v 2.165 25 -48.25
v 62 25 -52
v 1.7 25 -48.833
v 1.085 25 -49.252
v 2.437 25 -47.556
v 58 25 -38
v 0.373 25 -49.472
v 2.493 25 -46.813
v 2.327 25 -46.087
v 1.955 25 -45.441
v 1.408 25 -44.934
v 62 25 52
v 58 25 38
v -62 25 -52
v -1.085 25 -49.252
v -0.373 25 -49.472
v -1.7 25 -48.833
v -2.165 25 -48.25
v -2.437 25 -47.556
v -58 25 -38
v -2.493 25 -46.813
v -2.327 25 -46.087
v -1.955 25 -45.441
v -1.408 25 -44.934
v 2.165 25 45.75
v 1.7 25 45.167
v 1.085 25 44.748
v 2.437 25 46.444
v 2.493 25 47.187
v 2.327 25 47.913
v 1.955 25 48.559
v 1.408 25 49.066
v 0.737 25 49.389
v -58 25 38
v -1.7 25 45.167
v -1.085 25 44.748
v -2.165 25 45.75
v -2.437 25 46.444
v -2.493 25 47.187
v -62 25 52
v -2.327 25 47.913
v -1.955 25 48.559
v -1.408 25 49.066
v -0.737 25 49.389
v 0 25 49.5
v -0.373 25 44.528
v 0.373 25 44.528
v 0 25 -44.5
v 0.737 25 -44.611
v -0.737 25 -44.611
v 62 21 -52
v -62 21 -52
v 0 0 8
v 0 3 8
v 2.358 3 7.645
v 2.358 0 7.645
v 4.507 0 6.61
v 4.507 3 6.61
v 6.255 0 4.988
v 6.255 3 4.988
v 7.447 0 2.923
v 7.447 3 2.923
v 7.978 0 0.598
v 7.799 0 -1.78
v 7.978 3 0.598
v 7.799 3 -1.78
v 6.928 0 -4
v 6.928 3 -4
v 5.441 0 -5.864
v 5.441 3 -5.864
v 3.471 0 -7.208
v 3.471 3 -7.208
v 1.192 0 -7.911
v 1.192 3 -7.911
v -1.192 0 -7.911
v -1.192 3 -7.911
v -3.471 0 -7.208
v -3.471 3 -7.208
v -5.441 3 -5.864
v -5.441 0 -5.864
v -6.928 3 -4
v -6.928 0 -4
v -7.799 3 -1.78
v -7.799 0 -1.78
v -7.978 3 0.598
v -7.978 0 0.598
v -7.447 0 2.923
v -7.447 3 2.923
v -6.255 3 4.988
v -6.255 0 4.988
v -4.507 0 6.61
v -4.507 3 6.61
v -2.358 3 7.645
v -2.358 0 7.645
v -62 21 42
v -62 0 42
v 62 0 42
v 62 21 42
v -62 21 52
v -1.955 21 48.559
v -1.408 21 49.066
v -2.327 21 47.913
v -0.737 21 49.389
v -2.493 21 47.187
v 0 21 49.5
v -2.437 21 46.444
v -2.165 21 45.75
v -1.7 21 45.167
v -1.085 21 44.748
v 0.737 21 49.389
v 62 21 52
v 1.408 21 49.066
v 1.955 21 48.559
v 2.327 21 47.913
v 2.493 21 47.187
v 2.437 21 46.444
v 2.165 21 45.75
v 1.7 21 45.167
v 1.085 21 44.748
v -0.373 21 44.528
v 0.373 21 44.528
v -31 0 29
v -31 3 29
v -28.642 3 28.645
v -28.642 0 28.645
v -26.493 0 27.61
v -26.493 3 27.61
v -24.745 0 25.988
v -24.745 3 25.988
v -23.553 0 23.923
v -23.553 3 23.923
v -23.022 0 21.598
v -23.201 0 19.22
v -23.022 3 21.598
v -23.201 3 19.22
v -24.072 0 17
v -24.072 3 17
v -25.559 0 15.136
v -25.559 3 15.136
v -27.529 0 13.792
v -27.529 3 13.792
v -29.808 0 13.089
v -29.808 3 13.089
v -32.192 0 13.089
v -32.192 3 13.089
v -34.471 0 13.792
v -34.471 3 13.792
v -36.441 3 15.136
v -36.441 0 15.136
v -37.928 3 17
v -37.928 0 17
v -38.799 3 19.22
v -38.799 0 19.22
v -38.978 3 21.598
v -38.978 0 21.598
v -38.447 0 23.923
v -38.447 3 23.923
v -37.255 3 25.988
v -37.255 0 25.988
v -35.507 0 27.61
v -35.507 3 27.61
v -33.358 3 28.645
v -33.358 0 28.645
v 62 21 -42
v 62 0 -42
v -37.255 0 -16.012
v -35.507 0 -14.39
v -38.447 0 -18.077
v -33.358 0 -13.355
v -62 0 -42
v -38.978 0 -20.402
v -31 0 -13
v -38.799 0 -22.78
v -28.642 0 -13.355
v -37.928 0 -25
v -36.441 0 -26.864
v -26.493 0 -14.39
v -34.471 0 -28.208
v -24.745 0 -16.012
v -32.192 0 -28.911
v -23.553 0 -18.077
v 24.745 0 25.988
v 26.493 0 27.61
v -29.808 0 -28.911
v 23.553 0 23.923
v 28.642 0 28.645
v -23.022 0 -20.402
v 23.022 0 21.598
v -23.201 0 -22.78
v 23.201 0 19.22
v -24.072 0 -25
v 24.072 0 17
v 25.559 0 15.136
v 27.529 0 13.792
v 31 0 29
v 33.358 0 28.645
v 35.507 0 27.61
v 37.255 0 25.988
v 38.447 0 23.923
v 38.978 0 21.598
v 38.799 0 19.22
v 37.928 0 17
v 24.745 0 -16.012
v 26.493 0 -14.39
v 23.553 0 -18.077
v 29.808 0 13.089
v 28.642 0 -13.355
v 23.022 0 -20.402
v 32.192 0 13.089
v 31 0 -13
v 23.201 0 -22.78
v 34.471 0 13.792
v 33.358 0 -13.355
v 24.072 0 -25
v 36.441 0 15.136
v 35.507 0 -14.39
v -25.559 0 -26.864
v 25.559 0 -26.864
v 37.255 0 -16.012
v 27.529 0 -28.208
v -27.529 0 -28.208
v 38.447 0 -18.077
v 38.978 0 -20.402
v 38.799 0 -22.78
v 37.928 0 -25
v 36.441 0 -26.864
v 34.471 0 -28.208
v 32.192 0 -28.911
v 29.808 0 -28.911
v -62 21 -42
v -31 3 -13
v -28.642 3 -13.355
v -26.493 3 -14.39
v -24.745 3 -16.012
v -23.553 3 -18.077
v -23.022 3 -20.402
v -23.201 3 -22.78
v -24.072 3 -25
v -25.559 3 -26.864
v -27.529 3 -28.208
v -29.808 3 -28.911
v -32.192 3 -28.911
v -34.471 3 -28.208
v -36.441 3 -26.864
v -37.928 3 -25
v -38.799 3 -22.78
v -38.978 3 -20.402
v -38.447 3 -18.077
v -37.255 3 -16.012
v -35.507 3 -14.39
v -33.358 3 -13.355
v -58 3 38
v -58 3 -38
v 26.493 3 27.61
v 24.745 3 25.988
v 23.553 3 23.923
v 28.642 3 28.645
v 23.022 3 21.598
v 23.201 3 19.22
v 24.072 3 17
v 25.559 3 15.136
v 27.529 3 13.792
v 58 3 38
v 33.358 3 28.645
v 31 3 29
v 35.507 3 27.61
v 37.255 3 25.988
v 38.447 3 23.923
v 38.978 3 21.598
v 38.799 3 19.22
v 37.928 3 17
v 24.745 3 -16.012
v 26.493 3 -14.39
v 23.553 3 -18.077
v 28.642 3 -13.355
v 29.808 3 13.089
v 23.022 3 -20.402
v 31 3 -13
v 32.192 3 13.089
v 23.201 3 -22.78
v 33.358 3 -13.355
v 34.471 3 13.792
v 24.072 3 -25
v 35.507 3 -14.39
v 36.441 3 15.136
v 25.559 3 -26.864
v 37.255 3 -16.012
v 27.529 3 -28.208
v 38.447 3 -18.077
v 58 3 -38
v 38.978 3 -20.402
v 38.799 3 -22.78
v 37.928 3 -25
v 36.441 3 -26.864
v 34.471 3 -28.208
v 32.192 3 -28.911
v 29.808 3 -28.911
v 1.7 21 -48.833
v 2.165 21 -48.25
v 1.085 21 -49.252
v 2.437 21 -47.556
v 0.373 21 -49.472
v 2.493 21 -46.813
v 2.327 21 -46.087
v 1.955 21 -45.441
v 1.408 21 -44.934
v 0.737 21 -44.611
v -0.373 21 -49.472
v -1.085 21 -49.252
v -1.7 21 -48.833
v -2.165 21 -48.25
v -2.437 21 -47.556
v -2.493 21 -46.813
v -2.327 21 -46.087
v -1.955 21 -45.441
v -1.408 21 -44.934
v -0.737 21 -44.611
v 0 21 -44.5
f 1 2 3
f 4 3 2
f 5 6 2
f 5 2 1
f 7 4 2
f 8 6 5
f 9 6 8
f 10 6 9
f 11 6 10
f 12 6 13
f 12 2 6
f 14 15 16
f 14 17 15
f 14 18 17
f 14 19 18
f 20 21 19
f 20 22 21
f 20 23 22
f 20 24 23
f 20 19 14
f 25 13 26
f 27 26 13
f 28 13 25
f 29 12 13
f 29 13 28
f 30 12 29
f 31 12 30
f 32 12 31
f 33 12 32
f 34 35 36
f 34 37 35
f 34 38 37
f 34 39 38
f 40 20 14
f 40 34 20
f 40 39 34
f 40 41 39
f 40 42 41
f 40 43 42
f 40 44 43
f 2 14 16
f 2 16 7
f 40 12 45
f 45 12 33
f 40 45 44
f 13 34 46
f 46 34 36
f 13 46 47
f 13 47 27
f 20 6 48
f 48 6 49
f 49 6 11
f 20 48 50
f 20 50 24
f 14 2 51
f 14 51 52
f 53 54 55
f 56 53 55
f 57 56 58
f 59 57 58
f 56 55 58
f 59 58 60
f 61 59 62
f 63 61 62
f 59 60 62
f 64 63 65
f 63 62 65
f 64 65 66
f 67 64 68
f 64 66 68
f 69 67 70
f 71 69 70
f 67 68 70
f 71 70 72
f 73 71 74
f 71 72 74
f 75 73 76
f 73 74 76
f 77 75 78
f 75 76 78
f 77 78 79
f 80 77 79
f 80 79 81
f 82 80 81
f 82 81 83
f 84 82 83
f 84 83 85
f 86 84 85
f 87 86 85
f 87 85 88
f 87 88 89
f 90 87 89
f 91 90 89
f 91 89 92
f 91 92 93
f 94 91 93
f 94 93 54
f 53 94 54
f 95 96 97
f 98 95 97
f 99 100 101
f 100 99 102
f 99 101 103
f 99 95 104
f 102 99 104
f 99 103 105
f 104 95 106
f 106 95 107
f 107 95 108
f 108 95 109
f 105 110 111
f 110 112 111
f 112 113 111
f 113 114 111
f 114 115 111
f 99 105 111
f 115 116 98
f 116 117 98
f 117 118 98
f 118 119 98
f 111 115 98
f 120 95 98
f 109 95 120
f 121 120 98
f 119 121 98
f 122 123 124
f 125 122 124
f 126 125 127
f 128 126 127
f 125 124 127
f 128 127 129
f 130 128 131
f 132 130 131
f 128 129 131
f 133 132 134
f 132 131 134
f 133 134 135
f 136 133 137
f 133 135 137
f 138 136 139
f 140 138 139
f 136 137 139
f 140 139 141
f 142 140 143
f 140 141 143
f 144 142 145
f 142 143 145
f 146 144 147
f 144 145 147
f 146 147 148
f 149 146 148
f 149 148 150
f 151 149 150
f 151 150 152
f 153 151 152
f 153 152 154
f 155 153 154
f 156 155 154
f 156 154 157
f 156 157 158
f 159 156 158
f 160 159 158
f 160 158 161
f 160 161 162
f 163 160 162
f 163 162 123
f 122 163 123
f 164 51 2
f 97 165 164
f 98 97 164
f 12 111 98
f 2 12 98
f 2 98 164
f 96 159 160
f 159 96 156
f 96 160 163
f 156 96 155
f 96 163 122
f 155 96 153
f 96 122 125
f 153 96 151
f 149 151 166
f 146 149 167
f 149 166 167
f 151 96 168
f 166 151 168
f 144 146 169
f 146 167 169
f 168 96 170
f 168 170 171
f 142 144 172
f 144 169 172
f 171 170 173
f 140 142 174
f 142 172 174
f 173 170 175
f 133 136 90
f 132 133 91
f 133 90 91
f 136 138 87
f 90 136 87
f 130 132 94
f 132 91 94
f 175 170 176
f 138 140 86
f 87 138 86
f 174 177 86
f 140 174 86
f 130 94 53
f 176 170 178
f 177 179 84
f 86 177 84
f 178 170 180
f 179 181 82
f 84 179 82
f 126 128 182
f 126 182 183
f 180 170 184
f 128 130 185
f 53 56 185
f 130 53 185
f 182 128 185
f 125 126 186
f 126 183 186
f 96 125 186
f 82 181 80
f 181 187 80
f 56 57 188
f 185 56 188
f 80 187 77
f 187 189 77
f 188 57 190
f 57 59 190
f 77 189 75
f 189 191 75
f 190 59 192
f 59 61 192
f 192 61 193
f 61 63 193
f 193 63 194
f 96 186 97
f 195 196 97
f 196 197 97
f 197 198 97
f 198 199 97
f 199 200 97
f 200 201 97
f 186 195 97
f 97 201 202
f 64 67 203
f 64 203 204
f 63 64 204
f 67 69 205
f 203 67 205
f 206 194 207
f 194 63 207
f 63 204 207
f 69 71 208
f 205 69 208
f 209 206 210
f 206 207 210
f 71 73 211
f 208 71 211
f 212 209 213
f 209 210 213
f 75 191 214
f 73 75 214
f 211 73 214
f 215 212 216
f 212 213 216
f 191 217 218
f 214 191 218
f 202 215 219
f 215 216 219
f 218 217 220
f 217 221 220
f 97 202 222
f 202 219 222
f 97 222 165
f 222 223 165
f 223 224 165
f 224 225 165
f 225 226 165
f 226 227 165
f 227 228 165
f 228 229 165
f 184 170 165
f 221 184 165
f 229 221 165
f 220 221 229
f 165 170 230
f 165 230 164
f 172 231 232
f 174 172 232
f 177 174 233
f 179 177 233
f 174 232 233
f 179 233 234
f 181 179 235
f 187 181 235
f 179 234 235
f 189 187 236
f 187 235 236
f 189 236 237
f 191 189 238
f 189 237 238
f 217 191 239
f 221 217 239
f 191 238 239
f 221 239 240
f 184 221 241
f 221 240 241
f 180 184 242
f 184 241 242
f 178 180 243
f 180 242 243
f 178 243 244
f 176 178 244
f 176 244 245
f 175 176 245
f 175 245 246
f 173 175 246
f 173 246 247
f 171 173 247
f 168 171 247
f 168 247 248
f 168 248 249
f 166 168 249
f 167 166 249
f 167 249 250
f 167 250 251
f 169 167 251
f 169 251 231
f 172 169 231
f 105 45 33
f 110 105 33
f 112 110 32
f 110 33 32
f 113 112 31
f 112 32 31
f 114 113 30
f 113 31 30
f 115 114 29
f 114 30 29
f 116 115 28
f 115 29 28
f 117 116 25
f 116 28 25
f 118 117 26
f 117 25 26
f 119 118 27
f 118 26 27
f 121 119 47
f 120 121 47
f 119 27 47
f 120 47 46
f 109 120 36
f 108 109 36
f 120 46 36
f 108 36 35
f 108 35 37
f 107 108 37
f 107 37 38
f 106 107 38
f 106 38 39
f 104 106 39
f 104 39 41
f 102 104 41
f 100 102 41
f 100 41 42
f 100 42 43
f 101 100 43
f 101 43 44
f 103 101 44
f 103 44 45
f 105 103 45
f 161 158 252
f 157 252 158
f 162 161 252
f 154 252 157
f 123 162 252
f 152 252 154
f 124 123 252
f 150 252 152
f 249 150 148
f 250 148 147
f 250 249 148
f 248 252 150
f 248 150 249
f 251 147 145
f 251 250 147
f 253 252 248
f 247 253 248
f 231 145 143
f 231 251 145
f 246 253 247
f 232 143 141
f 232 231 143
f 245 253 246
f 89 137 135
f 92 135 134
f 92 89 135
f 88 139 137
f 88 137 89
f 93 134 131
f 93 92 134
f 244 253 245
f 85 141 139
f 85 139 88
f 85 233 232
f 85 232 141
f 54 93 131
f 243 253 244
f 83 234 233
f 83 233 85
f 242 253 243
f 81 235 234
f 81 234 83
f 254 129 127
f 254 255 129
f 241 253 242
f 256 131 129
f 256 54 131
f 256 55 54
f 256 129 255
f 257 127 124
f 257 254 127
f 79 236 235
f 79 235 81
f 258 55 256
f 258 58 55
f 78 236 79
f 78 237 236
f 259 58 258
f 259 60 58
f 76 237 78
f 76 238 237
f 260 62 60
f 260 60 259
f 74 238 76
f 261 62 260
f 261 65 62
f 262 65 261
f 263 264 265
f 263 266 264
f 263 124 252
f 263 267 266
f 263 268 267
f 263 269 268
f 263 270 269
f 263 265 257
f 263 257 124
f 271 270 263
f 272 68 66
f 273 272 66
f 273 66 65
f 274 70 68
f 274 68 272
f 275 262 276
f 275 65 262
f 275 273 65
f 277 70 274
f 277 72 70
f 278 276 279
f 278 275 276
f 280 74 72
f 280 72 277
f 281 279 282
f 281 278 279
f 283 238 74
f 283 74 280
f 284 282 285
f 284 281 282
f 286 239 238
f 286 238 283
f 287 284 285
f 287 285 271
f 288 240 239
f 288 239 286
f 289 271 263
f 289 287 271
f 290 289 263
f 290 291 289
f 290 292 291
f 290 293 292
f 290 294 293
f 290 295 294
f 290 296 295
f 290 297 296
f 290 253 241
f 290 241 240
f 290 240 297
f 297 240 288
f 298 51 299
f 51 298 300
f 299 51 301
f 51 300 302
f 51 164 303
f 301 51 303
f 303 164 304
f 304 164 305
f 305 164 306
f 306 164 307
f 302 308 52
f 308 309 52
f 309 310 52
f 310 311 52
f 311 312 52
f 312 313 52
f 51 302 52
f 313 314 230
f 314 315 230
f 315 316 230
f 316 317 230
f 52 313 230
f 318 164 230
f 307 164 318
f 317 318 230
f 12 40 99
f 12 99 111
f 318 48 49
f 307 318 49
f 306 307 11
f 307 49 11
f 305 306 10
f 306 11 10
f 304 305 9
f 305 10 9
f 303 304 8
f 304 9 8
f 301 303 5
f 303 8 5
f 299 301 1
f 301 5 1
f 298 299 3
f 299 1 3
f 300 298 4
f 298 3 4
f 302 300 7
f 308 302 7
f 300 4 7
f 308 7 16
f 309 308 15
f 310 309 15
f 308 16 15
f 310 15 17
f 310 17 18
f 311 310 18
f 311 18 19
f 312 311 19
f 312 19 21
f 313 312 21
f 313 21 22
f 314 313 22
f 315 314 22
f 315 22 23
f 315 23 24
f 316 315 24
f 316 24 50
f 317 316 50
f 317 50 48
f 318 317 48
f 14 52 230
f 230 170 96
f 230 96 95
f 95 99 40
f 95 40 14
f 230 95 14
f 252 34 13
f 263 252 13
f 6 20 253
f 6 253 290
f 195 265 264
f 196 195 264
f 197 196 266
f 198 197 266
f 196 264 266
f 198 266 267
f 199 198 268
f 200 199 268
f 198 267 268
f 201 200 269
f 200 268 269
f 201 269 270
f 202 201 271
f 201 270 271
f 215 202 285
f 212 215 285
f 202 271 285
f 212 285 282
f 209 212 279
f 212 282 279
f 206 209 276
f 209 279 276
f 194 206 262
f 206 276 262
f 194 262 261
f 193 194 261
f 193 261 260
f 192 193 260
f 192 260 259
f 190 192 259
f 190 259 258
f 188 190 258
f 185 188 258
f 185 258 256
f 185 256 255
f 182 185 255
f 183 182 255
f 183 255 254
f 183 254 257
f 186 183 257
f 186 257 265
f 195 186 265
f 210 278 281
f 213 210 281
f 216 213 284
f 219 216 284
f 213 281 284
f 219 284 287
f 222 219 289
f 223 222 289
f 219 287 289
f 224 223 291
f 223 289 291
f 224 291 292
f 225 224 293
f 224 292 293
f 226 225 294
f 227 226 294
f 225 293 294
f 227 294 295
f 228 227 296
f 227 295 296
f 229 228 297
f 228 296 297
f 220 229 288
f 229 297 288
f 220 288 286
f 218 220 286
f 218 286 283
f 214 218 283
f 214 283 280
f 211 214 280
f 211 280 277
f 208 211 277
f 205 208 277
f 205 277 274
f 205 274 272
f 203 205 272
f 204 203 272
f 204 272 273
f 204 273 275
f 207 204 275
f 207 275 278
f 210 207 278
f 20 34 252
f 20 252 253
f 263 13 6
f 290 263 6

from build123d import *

# Parameters (mm, degrees)
SKETCH1_W           = 124
SKETCH1_H           = 84
BOSS_EXTRUDE1_DEPTH = 25
SKETCH2_W           = 116
SKETCH2_H           = 76
CUT_EXTRUDE1_DEPTH  = 22
SKETCH3_R           = 8
CUT_EXTRUDE2_DEPTH  = 79.051265204
SKETCH4_W           = 124
SKETCH4_H           = 4
BOSS_EXTRUDE2_DEPTH = 10
SKETCH5_W           = 124
SKETCH5_H           = 4
BOSS_EXTRUDE3_DEPTH = 10
SKETCH6_R           = 2.5
CUT_EXTRUDE3_DEPTH  = 85.693565281


with BuildPart() as part:
    # Sketch1 → Boss-Extrude1 (new body)
    with BuildSketch(Plane(origin=(0, 0, 0), x_dir=(1, 0, 0), z_dir=(0, 1, 0))):
        Rectangle(SKETCH1_W, SKETCH1_H)
    extrude(amount=BOSS_EXTRUDE1_DEPTH)

    # Sketch2 → Cut-Extrude1 (cut)
    with BuildSketch(Plane(origin=(0, 25, 0), x_dir=(1, 0, 0), z_dir=(0, 1, 0))):
        Rectangle(SKETCH2_W, SKETCH2_H)
    extrude(amount=-CUT_EXTRUDE1_DEPTH, mode=Mode.SUBTRACT)

    # Sketch3 → Cut-Extrude2 (cut, through all)
    with BuildSketch(Plane(origin=(0, 3, 0), x_dir=(1, 0, 0), z_dir=(0, 1, 0))):
        with Locations(Location((0, 0, 0), (0, 0, 270))):
            Circle(SKETCH3_R)
        with Locations(Location((-31, 21, 0), (0, 0, 270))):
            Circle(SKETCH3_R)
        with Locations(Location((-31, -21, 0), (0, 0, 270))):
            Circle(SKETCH3_R)
        with Locations(Location((31, 21, 0), (0, 0, 270))):
            Circle(SKETCH3_R)
        with Locations(Location((31, -21, 0), (0, 0, 270))):
            Circle(SKETCH3_R)
    extrude(amount=-CUT_EXTRUDE2_DEPTH, mode=Mode.SUBTRACT)

    # Sketch4 → Boss-Extrude2 (add)
    with BuildSketch(Plane.XY.offset(42)):
        with Locations((0, 23)):
            Rectangle(SKETCH4_W, SKETCH4_H)
    extrude(amount=BOSS_EXTRUDE2_DEPTH)

    # Sketch5 → Boss-Extrude3 (add)
    with BuildSketch(Plane(origin=(0, 0, -42), x_dir=(-1, 0, 0), z_dir=(0, 0, -1))):
        with Locations((0, 23)):
            Rectangle(SKETCH5_W, SKETCH5_H)
    extrude(amount=BOSS_EXTRUDE3_DEPTH)

    # Sketch6 → Cut-Extrude3 (cut, through all)
    with BuildSketch(Plane(origin=(0, 25, 0), x_dir=(1, 0, 0), z_dir=(0, 1, 0))):
        with Locations(Location((0, 47, 0), (0, 0, 270))):
            Circle(SKETCH6_R)
        with Locations(Location((0, -47, 0), (0, 0, 270))):
            Circle(SKETCH6_R)
    extrude(amount=-CUT_EXTRUDE3_DEPTH, mode=Mode.SUBTRACT)


solid = part.part
